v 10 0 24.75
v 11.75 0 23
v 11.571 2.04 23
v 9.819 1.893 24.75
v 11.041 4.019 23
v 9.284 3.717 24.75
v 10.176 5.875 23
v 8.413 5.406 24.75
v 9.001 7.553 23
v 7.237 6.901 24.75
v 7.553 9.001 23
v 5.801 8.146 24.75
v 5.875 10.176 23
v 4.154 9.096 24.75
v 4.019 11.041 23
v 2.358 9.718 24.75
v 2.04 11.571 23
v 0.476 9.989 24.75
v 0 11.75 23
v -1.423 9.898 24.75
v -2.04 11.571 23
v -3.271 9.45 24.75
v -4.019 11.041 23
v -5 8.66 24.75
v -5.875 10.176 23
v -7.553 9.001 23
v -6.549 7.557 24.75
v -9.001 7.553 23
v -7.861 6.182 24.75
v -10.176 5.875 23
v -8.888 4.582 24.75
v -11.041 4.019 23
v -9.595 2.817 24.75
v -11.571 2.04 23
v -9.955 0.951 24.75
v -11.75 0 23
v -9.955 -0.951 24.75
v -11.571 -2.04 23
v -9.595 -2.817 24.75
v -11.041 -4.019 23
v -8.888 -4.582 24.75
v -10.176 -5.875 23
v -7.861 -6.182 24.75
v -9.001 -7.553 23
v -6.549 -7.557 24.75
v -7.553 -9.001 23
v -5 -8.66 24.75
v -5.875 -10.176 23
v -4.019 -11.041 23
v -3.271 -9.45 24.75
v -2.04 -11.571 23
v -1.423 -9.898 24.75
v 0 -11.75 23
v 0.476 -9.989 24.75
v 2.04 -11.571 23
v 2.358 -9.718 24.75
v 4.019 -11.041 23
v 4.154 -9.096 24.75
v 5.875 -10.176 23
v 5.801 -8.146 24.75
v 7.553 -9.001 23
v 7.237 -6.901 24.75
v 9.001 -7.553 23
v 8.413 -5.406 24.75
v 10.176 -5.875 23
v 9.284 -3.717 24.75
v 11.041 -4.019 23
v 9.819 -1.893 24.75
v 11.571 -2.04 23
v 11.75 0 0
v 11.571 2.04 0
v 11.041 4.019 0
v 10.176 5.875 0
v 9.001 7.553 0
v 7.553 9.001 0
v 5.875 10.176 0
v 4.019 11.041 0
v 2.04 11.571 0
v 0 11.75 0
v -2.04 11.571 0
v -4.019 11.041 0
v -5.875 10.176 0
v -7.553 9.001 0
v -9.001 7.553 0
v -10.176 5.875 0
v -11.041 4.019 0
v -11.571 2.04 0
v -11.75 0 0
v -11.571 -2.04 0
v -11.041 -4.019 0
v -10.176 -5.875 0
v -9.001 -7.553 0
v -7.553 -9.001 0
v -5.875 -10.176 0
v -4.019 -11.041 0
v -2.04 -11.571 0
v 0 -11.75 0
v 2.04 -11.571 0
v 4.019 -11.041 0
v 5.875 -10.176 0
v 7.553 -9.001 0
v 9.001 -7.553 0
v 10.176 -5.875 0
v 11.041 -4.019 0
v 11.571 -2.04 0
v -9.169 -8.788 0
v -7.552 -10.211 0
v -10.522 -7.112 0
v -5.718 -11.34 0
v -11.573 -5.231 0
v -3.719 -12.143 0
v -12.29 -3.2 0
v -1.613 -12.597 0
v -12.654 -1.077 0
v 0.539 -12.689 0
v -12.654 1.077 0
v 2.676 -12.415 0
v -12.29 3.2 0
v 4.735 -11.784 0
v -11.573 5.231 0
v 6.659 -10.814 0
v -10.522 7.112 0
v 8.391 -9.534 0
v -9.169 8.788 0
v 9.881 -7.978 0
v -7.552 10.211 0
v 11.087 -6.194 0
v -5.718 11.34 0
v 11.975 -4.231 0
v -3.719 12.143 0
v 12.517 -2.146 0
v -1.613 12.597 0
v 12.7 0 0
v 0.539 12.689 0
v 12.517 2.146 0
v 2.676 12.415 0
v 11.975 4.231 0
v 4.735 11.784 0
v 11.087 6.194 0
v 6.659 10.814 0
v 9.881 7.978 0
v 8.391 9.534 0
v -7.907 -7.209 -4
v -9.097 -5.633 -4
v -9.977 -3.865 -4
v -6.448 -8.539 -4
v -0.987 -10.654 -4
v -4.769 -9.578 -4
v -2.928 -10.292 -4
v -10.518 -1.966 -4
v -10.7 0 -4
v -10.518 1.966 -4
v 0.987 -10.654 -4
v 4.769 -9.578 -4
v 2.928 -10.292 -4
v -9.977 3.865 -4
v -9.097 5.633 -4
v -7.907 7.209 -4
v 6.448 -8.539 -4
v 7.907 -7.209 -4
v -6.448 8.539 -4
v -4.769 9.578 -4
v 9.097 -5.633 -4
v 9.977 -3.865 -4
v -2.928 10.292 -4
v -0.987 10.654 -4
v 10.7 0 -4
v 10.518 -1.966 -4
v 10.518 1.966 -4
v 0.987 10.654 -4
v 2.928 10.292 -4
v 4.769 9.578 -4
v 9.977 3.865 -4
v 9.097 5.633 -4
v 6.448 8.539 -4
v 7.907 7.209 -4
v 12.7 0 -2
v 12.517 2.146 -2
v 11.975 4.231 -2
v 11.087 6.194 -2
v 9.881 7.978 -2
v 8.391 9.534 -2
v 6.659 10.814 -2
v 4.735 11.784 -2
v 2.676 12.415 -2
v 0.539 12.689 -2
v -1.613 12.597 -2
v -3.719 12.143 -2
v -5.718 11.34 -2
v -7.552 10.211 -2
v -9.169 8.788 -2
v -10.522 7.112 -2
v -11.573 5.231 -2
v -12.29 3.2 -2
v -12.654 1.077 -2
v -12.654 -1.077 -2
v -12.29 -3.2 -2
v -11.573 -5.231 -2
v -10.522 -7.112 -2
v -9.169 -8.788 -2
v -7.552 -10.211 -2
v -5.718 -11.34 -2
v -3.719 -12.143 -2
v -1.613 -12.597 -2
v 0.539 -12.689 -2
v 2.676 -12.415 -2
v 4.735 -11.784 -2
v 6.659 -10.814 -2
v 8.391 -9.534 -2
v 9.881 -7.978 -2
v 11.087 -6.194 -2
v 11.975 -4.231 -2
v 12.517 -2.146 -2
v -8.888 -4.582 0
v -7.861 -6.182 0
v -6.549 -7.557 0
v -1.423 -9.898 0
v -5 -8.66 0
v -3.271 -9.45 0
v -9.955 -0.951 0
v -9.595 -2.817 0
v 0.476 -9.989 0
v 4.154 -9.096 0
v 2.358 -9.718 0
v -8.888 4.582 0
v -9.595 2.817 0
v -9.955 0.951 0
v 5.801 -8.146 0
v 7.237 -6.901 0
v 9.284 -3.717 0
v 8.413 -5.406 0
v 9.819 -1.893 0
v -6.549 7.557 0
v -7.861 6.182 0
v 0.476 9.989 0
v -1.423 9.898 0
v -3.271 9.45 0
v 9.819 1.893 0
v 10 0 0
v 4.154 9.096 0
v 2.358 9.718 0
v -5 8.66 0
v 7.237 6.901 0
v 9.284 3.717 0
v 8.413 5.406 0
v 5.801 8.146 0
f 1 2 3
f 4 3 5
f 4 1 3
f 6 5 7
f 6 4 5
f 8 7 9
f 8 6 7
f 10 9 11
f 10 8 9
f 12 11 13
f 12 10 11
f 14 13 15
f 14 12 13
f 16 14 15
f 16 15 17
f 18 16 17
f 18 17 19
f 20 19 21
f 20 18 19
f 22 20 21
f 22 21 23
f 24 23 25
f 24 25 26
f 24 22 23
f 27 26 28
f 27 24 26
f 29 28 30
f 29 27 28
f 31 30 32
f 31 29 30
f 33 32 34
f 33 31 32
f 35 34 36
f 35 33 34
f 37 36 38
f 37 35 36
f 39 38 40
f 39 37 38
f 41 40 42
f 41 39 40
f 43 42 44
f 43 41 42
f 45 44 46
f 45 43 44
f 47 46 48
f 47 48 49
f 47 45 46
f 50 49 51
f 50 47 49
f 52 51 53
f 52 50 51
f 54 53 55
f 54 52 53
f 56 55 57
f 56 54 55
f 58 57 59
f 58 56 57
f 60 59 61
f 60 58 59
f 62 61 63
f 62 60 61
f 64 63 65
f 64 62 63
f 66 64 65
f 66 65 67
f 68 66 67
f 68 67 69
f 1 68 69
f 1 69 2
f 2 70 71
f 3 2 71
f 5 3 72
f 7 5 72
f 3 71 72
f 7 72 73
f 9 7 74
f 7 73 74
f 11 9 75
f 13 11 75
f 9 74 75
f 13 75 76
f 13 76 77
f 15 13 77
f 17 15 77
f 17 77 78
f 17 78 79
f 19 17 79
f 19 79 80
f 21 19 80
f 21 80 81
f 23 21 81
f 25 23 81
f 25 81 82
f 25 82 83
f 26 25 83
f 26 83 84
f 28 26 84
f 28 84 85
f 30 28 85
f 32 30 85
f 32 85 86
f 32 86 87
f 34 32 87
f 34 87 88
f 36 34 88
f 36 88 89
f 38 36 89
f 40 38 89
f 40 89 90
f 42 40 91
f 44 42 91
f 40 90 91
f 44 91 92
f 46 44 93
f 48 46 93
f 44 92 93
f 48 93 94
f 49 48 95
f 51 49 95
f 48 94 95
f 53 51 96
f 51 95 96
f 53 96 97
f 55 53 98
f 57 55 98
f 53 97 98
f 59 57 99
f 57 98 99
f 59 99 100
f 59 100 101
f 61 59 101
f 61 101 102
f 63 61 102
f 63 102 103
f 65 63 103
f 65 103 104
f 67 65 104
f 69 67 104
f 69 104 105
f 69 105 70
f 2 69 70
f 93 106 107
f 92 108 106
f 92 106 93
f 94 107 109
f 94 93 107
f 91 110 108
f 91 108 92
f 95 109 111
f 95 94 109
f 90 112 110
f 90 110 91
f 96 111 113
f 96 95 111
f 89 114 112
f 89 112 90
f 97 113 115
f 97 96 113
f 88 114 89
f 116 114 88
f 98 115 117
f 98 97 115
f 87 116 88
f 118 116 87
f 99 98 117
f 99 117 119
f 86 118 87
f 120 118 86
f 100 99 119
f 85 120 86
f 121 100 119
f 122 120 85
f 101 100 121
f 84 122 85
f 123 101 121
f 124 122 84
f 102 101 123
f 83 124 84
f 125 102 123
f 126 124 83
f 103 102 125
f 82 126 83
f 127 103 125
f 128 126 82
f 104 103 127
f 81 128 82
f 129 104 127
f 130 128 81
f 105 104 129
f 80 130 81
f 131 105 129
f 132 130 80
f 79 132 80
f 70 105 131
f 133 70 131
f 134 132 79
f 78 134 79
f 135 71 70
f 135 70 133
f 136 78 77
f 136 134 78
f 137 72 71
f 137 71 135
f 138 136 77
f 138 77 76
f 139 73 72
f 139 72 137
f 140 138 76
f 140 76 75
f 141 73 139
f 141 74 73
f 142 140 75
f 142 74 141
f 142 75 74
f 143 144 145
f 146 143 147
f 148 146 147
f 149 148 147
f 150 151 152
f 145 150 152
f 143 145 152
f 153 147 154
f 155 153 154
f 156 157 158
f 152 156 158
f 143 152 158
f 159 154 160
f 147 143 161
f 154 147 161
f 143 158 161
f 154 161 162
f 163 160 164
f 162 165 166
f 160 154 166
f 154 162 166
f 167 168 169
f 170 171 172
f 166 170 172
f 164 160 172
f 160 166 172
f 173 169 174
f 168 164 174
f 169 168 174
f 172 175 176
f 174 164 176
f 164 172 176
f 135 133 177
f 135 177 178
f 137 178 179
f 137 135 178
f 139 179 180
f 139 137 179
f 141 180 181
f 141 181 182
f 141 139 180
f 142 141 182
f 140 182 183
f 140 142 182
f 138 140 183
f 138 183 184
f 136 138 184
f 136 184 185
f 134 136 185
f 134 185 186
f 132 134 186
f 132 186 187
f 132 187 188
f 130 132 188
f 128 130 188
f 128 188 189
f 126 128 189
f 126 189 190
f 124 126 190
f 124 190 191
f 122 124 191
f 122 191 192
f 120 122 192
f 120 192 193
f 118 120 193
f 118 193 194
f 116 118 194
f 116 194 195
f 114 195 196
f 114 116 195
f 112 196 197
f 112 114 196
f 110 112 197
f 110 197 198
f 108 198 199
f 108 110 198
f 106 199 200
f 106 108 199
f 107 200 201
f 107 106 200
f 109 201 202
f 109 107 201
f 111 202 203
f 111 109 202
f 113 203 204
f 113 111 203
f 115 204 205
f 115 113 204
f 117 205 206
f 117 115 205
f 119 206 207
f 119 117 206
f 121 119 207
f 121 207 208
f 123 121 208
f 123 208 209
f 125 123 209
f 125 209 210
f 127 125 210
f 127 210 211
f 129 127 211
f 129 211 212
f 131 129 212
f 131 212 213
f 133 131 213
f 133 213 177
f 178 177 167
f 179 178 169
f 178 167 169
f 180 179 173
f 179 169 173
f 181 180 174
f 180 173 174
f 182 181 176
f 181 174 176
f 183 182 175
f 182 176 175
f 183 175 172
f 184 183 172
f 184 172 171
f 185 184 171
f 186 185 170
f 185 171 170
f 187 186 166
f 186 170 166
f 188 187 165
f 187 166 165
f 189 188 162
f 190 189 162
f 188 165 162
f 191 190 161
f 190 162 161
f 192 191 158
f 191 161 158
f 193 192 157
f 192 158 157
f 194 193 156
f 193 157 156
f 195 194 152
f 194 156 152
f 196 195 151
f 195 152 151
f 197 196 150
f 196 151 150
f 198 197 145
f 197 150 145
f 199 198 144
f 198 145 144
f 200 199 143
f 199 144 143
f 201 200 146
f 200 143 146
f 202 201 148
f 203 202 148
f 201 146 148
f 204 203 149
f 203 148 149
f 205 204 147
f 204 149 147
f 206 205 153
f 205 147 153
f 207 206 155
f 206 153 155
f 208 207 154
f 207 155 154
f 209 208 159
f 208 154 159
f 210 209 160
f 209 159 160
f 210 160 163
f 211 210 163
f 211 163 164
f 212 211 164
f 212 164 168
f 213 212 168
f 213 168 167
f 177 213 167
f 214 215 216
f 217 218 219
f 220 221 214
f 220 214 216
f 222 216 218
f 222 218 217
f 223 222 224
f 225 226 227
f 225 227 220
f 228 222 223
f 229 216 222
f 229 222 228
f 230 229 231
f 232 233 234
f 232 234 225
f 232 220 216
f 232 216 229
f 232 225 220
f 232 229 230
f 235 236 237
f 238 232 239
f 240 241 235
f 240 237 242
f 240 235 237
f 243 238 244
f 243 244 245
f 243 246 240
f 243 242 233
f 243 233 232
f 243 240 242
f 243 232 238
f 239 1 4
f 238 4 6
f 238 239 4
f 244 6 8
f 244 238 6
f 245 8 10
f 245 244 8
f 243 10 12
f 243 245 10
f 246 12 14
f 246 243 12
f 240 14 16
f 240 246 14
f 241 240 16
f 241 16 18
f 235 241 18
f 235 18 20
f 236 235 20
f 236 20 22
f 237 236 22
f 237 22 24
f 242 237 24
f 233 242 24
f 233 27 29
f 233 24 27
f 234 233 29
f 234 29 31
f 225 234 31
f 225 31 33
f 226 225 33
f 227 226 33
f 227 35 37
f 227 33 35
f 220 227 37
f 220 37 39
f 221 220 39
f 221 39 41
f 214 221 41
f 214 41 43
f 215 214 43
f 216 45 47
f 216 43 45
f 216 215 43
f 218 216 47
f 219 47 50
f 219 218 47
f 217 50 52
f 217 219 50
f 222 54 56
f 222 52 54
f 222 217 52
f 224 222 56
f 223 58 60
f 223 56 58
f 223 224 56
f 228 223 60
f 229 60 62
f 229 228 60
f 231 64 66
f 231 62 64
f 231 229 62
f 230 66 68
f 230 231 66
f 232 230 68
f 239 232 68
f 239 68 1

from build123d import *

# Parameters (mm, degrees)
F0_R     = 12.7
F0_R_2   = 11.75
F0_R_3   = 10
F1_DEPTH = 4
F2_DEPTH = 25


# Not quite as in the source:
# - a fillet or chamfer that OpenCascade refuses, or shapes differently, is made with other operations: its cross-section is extruded or revolved along the edge and cut away or added


with BuildPart() as f1:
    # F0 (on Top) → F1 (new body)
    with BuildSketch(Plane.XY):
        Circle(F0_R)
        Circle(F0_R_2, mode=Mode.SUBTRACT)
        Circle(F0_R_2)
        Circle(F0_R_3, mode=Mode.SUBTRACT)
        Circle(F0_R_3)
    extrude(amount=-F1_DEPTH)

    # F0 (on Top) → F2 (join)
    with BuildSketch(Plane.XY):
        Circle(F0_R_2)
        Circle(F0_R_3, mode=Mode.SUBTRACT)
    extrude(amount=F2_DEPTH)

    # F3: chamfer of 2 on 2 edges, made by hand

    # F3_s1 → F3_t2 (revolve, cut)
    with BuildSketch(Plane.XZ):
        Polygon((11.75, 23), (9.75, 25), (11.75, 25), align=None)
    revolve(axis=Axis((0, 0, 25), (0, 0, 1)), mode=Mode.SUBTRACT)

    # F3_s3 → F3_t4 (revolve, cut)
    with BuildSketch(Plane.XZ):
        Polygon((12.7, -2), (10.7, -4), (12.7, -4), align=None)
    revolve(axis=Axis((0, 0, -4), (0, 0, 1)), mode=Mode.SUBTRACT)


solid = f1.part
